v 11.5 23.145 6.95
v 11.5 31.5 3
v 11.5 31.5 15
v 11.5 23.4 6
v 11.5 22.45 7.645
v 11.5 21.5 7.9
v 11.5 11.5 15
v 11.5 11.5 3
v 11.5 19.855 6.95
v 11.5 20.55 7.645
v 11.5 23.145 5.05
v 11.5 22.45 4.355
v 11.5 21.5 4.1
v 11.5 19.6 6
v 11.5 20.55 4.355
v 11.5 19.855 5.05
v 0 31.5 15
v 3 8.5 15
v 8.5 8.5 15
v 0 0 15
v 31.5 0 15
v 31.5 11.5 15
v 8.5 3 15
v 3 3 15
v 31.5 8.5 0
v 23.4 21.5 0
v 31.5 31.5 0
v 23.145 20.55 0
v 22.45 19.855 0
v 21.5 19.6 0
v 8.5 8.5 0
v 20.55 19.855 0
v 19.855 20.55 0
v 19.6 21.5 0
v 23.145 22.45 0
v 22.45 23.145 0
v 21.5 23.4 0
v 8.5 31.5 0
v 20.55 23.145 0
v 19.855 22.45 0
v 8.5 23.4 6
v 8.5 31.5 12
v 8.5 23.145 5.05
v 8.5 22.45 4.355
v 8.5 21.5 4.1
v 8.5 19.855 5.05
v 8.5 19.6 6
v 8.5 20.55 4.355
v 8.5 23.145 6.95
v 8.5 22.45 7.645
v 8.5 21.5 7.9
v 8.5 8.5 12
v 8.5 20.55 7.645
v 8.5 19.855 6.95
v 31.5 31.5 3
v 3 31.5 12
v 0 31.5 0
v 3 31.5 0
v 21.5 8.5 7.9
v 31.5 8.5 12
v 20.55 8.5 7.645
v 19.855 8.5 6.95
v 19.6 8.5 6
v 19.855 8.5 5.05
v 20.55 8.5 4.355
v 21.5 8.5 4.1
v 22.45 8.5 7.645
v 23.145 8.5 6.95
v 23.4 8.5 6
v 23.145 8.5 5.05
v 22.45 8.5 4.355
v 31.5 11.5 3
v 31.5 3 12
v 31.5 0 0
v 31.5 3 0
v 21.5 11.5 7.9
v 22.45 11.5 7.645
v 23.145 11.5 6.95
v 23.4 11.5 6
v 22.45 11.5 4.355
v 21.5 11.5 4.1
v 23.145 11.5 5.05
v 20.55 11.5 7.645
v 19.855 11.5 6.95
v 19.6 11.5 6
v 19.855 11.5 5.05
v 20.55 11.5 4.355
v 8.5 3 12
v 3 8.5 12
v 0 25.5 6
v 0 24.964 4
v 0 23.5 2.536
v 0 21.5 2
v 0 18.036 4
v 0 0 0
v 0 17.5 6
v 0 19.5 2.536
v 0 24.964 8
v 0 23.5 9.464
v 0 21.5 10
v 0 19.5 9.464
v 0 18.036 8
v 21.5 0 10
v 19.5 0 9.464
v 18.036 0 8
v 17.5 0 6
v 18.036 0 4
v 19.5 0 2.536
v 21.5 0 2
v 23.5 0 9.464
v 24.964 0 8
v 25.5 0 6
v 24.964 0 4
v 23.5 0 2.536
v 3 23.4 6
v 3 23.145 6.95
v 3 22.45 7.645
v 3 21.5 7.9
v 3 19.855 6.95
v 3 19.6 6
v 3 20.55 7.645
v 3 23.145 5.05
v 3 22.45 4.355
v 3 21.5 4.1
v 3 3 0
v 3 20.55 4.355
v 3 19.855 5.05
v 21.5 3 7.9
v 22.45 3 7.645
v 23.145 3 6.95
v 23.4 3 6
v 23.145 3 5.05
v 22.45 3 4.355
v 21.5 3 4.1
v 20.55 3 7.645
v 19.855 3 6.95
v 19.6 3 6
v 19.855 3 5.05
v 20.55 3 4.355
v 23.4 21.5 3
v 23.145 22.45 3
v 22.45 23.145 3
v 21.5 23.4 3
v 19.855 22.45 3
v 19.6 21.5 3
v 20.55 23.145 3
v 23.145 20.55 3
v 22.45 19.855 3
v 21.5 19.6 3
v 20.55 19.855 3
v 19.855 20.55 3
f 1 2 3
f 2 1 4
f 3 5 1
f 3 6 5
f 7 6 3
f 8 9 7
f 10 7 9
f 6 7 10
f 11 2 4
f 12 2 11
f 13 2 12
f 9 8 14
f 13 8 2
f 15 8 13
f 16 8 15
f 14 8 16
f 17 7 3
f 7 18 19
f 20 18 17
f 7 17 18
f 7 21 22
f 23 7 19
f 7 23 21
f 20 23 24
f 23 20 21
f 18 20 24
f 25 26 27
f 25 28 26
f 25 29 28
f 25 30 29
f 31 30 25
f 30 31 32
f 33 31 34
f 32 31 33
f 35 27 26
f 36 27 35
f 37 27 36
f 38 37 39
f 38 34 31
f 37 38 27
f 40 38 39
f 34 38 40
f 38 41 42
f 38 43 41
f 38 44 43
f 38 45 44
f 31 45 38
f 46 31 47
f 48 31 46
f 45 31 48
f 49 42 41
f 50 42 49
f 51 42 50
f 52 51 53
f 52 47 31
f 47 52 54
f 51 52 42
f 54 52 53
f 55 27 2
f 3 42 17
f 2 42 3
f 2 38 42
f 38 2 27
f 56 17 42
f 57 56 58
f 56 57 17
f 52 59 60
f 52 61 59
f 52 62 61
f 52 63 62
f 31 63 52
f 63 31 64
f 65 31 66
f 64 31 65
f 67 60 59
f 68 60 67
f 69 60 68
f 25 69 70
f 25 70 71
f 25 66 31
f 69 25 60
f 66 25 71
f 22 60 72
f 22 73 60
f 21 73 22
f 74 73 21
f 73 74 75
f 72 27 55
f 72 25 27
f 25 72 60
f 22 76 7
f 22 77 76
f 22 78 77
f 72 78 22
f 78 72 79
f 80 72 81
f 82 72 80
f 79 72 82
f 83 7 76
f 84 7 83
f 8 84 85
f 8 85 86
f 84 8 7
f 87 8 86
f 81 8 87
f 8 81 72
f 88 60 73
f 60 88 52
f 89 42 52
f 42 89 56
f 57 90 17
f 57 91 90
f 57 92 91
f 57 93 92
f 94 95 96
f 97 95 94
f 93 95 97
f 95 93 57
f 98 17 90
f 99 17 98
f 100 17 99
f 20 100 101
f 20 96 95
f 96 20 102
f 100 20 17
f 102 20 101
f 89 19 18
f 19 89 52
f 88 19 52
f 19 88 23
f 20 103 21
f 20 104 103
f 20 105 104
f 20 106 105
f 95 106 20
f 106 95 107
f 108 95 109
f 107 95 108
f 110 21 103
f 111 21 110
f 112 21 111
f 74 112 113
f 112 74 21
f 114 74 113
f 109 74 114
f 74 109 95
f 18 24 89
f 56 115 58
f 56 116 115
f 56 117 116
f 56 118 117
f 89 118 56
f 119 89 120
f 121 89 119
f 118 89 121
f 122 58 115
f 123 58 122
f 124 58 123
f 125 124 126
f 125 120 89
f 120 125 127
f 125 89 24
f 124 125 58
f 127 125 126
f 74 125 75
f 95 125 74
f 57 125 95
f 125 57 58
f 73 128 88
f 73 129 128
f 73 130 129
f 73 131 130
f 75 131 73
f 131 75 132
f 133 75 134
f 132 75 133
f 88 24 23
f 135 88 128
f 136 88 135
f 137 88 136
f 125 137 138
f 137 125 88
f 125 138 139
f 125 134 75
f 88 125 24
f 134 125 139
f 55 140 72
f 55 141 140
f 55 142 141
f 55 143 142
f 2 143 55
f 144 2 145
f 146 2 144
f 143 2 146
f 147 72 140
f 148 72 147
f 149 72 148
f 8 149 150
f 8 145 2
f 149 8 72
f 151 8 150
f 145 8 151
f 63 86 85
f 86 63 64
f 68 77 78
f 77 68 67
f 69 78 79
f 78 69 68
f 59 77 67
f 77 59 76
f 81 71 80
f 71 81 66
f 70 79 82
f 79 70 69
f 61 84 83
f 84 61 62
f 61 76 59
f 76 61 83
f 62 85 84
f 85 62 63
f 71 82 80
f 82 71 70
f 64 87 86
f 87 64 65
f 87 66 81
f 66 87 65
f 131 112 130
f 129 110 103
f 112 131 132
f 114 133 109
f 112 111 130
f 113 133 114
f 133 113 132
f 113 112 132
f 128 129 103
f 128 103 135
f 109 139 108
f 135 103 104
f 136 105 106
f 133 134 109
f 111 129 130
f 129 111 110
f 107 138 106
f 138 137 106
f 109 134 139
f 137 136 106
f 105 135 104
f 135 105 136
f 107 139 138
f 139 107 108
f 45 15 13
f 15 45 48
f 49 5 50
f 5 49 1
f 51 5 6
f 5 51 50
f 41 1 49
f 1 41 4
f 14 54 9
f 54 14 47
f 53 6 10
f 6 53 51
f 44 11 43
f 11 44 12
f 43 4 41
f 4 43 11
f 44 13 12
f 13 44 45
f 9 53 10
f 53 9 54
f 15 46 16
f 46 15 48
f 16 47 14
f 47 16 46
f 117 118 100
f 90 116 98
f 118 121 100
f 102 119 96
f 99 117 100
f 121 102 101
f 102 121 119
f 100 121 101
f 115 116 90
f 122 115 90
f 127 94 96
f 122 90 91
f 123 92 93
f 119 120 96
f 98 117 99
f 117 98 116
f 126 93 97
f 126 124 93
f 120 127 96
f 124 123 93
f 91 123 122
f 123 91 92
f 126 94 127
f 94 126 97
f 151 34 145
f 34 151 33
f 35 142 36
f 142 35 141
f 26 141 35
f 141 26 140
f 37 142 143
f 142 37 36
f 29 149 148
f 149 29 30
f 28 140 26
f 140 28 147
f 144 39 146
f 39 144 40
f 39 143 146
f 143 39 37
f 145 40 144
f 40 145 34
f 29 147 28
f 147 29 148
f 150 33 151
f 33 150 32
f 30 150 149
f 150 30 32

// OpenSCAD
difference(){
	union() {
		cube(size = [3, 31.5000000000, 15]);
		cube(size = [31.5000000000, 3, 15]);
		translate(v = [8.5000000000, 8.5000000000, 0]) {
			cube(size = [3, 23, 15]);
			cube(size = [23, 3, 15]);
		}
		translate(v = [0, 0, 12]) {
			translate(v = [0, 8.5000000000, 0]) {
				cube(size = [11.5000000000, 23, 3]);
			}
			translate(v = [8.5000000000, 0, 0]) {
				cube(size = [23, 11.5000000000, 3]);
			}
		}
		translate(v = [11.5000000000, 11.5000000000, 0]) {
			cube(size = [20, 20, 3]);
		}
		translate(v = [21.5000000000, 0, 6.0000000000]) {
			rotate(a = 90, v = [1, 0, 0]) {
			}
		}
		translate(v = [0, 21.5000000000, 6.0000000000]) {
			rotate(a = -90, v = [0, 1, 0]) {
			}
		}
		translate(v = [21.5000000000, 21.5000000000, 8]) {
		}
	}
	/* Holes Below*/
	union(){
		translate(v = [21.5000000000, 0, 6.0000000000]){
			rotate(a = 90, v = [1, 0, 0]){
				union() {
					union() {
						translate(v = [0, 0, -12.5000000000]) {
							cylinder($fn = 12, h = 12.5000000000, r = 1.9000000000);
						}
						translate(v = [0, 0, -3]) {
							cylinder($fn = 12, h = 3, r1 = 1.9000000000, r2 = 4);
						}
					}
					cylinder($fn = 12, h = 1, r = 4);
				}
			}
		}
		translate(v = [0, 21.5000000000, 6.0000000000]){
			rotate(a = -90, v = [0, 1, 0]){
				union() {
					union() {
						translate(v = [0, 0, -12.5000000000]) {
							cylinder($fn = 12, h = 12.5000000000, r = 1.9000000000);
						}
						translate(v = [0, 0, -3]) {
							cylinder($fn = 12, h = 3, r1 = 1.9000000000, r2 = 4);
						}
					}
					cylinder($fn = 12, h = 1, r = 4);
				}
			}
		}
		translate(v = [21.5000000000, 21.5000000000, 8]){
			union() {
				union() {
					translate(v = [0, 0, -9]) {
						cylinder($fn = 12, h = 9, r = 1.9000000000);
					}
					translate(v = [0, 0, -3]) {
						cylinder($fn = 12, h = 3, r1 = 1.9000000000, r2 = 4);
					}
				}
				cylinder($fn = 12, h = 1, r = 4);
			}
		}
	} /* End Holes */ 
}
